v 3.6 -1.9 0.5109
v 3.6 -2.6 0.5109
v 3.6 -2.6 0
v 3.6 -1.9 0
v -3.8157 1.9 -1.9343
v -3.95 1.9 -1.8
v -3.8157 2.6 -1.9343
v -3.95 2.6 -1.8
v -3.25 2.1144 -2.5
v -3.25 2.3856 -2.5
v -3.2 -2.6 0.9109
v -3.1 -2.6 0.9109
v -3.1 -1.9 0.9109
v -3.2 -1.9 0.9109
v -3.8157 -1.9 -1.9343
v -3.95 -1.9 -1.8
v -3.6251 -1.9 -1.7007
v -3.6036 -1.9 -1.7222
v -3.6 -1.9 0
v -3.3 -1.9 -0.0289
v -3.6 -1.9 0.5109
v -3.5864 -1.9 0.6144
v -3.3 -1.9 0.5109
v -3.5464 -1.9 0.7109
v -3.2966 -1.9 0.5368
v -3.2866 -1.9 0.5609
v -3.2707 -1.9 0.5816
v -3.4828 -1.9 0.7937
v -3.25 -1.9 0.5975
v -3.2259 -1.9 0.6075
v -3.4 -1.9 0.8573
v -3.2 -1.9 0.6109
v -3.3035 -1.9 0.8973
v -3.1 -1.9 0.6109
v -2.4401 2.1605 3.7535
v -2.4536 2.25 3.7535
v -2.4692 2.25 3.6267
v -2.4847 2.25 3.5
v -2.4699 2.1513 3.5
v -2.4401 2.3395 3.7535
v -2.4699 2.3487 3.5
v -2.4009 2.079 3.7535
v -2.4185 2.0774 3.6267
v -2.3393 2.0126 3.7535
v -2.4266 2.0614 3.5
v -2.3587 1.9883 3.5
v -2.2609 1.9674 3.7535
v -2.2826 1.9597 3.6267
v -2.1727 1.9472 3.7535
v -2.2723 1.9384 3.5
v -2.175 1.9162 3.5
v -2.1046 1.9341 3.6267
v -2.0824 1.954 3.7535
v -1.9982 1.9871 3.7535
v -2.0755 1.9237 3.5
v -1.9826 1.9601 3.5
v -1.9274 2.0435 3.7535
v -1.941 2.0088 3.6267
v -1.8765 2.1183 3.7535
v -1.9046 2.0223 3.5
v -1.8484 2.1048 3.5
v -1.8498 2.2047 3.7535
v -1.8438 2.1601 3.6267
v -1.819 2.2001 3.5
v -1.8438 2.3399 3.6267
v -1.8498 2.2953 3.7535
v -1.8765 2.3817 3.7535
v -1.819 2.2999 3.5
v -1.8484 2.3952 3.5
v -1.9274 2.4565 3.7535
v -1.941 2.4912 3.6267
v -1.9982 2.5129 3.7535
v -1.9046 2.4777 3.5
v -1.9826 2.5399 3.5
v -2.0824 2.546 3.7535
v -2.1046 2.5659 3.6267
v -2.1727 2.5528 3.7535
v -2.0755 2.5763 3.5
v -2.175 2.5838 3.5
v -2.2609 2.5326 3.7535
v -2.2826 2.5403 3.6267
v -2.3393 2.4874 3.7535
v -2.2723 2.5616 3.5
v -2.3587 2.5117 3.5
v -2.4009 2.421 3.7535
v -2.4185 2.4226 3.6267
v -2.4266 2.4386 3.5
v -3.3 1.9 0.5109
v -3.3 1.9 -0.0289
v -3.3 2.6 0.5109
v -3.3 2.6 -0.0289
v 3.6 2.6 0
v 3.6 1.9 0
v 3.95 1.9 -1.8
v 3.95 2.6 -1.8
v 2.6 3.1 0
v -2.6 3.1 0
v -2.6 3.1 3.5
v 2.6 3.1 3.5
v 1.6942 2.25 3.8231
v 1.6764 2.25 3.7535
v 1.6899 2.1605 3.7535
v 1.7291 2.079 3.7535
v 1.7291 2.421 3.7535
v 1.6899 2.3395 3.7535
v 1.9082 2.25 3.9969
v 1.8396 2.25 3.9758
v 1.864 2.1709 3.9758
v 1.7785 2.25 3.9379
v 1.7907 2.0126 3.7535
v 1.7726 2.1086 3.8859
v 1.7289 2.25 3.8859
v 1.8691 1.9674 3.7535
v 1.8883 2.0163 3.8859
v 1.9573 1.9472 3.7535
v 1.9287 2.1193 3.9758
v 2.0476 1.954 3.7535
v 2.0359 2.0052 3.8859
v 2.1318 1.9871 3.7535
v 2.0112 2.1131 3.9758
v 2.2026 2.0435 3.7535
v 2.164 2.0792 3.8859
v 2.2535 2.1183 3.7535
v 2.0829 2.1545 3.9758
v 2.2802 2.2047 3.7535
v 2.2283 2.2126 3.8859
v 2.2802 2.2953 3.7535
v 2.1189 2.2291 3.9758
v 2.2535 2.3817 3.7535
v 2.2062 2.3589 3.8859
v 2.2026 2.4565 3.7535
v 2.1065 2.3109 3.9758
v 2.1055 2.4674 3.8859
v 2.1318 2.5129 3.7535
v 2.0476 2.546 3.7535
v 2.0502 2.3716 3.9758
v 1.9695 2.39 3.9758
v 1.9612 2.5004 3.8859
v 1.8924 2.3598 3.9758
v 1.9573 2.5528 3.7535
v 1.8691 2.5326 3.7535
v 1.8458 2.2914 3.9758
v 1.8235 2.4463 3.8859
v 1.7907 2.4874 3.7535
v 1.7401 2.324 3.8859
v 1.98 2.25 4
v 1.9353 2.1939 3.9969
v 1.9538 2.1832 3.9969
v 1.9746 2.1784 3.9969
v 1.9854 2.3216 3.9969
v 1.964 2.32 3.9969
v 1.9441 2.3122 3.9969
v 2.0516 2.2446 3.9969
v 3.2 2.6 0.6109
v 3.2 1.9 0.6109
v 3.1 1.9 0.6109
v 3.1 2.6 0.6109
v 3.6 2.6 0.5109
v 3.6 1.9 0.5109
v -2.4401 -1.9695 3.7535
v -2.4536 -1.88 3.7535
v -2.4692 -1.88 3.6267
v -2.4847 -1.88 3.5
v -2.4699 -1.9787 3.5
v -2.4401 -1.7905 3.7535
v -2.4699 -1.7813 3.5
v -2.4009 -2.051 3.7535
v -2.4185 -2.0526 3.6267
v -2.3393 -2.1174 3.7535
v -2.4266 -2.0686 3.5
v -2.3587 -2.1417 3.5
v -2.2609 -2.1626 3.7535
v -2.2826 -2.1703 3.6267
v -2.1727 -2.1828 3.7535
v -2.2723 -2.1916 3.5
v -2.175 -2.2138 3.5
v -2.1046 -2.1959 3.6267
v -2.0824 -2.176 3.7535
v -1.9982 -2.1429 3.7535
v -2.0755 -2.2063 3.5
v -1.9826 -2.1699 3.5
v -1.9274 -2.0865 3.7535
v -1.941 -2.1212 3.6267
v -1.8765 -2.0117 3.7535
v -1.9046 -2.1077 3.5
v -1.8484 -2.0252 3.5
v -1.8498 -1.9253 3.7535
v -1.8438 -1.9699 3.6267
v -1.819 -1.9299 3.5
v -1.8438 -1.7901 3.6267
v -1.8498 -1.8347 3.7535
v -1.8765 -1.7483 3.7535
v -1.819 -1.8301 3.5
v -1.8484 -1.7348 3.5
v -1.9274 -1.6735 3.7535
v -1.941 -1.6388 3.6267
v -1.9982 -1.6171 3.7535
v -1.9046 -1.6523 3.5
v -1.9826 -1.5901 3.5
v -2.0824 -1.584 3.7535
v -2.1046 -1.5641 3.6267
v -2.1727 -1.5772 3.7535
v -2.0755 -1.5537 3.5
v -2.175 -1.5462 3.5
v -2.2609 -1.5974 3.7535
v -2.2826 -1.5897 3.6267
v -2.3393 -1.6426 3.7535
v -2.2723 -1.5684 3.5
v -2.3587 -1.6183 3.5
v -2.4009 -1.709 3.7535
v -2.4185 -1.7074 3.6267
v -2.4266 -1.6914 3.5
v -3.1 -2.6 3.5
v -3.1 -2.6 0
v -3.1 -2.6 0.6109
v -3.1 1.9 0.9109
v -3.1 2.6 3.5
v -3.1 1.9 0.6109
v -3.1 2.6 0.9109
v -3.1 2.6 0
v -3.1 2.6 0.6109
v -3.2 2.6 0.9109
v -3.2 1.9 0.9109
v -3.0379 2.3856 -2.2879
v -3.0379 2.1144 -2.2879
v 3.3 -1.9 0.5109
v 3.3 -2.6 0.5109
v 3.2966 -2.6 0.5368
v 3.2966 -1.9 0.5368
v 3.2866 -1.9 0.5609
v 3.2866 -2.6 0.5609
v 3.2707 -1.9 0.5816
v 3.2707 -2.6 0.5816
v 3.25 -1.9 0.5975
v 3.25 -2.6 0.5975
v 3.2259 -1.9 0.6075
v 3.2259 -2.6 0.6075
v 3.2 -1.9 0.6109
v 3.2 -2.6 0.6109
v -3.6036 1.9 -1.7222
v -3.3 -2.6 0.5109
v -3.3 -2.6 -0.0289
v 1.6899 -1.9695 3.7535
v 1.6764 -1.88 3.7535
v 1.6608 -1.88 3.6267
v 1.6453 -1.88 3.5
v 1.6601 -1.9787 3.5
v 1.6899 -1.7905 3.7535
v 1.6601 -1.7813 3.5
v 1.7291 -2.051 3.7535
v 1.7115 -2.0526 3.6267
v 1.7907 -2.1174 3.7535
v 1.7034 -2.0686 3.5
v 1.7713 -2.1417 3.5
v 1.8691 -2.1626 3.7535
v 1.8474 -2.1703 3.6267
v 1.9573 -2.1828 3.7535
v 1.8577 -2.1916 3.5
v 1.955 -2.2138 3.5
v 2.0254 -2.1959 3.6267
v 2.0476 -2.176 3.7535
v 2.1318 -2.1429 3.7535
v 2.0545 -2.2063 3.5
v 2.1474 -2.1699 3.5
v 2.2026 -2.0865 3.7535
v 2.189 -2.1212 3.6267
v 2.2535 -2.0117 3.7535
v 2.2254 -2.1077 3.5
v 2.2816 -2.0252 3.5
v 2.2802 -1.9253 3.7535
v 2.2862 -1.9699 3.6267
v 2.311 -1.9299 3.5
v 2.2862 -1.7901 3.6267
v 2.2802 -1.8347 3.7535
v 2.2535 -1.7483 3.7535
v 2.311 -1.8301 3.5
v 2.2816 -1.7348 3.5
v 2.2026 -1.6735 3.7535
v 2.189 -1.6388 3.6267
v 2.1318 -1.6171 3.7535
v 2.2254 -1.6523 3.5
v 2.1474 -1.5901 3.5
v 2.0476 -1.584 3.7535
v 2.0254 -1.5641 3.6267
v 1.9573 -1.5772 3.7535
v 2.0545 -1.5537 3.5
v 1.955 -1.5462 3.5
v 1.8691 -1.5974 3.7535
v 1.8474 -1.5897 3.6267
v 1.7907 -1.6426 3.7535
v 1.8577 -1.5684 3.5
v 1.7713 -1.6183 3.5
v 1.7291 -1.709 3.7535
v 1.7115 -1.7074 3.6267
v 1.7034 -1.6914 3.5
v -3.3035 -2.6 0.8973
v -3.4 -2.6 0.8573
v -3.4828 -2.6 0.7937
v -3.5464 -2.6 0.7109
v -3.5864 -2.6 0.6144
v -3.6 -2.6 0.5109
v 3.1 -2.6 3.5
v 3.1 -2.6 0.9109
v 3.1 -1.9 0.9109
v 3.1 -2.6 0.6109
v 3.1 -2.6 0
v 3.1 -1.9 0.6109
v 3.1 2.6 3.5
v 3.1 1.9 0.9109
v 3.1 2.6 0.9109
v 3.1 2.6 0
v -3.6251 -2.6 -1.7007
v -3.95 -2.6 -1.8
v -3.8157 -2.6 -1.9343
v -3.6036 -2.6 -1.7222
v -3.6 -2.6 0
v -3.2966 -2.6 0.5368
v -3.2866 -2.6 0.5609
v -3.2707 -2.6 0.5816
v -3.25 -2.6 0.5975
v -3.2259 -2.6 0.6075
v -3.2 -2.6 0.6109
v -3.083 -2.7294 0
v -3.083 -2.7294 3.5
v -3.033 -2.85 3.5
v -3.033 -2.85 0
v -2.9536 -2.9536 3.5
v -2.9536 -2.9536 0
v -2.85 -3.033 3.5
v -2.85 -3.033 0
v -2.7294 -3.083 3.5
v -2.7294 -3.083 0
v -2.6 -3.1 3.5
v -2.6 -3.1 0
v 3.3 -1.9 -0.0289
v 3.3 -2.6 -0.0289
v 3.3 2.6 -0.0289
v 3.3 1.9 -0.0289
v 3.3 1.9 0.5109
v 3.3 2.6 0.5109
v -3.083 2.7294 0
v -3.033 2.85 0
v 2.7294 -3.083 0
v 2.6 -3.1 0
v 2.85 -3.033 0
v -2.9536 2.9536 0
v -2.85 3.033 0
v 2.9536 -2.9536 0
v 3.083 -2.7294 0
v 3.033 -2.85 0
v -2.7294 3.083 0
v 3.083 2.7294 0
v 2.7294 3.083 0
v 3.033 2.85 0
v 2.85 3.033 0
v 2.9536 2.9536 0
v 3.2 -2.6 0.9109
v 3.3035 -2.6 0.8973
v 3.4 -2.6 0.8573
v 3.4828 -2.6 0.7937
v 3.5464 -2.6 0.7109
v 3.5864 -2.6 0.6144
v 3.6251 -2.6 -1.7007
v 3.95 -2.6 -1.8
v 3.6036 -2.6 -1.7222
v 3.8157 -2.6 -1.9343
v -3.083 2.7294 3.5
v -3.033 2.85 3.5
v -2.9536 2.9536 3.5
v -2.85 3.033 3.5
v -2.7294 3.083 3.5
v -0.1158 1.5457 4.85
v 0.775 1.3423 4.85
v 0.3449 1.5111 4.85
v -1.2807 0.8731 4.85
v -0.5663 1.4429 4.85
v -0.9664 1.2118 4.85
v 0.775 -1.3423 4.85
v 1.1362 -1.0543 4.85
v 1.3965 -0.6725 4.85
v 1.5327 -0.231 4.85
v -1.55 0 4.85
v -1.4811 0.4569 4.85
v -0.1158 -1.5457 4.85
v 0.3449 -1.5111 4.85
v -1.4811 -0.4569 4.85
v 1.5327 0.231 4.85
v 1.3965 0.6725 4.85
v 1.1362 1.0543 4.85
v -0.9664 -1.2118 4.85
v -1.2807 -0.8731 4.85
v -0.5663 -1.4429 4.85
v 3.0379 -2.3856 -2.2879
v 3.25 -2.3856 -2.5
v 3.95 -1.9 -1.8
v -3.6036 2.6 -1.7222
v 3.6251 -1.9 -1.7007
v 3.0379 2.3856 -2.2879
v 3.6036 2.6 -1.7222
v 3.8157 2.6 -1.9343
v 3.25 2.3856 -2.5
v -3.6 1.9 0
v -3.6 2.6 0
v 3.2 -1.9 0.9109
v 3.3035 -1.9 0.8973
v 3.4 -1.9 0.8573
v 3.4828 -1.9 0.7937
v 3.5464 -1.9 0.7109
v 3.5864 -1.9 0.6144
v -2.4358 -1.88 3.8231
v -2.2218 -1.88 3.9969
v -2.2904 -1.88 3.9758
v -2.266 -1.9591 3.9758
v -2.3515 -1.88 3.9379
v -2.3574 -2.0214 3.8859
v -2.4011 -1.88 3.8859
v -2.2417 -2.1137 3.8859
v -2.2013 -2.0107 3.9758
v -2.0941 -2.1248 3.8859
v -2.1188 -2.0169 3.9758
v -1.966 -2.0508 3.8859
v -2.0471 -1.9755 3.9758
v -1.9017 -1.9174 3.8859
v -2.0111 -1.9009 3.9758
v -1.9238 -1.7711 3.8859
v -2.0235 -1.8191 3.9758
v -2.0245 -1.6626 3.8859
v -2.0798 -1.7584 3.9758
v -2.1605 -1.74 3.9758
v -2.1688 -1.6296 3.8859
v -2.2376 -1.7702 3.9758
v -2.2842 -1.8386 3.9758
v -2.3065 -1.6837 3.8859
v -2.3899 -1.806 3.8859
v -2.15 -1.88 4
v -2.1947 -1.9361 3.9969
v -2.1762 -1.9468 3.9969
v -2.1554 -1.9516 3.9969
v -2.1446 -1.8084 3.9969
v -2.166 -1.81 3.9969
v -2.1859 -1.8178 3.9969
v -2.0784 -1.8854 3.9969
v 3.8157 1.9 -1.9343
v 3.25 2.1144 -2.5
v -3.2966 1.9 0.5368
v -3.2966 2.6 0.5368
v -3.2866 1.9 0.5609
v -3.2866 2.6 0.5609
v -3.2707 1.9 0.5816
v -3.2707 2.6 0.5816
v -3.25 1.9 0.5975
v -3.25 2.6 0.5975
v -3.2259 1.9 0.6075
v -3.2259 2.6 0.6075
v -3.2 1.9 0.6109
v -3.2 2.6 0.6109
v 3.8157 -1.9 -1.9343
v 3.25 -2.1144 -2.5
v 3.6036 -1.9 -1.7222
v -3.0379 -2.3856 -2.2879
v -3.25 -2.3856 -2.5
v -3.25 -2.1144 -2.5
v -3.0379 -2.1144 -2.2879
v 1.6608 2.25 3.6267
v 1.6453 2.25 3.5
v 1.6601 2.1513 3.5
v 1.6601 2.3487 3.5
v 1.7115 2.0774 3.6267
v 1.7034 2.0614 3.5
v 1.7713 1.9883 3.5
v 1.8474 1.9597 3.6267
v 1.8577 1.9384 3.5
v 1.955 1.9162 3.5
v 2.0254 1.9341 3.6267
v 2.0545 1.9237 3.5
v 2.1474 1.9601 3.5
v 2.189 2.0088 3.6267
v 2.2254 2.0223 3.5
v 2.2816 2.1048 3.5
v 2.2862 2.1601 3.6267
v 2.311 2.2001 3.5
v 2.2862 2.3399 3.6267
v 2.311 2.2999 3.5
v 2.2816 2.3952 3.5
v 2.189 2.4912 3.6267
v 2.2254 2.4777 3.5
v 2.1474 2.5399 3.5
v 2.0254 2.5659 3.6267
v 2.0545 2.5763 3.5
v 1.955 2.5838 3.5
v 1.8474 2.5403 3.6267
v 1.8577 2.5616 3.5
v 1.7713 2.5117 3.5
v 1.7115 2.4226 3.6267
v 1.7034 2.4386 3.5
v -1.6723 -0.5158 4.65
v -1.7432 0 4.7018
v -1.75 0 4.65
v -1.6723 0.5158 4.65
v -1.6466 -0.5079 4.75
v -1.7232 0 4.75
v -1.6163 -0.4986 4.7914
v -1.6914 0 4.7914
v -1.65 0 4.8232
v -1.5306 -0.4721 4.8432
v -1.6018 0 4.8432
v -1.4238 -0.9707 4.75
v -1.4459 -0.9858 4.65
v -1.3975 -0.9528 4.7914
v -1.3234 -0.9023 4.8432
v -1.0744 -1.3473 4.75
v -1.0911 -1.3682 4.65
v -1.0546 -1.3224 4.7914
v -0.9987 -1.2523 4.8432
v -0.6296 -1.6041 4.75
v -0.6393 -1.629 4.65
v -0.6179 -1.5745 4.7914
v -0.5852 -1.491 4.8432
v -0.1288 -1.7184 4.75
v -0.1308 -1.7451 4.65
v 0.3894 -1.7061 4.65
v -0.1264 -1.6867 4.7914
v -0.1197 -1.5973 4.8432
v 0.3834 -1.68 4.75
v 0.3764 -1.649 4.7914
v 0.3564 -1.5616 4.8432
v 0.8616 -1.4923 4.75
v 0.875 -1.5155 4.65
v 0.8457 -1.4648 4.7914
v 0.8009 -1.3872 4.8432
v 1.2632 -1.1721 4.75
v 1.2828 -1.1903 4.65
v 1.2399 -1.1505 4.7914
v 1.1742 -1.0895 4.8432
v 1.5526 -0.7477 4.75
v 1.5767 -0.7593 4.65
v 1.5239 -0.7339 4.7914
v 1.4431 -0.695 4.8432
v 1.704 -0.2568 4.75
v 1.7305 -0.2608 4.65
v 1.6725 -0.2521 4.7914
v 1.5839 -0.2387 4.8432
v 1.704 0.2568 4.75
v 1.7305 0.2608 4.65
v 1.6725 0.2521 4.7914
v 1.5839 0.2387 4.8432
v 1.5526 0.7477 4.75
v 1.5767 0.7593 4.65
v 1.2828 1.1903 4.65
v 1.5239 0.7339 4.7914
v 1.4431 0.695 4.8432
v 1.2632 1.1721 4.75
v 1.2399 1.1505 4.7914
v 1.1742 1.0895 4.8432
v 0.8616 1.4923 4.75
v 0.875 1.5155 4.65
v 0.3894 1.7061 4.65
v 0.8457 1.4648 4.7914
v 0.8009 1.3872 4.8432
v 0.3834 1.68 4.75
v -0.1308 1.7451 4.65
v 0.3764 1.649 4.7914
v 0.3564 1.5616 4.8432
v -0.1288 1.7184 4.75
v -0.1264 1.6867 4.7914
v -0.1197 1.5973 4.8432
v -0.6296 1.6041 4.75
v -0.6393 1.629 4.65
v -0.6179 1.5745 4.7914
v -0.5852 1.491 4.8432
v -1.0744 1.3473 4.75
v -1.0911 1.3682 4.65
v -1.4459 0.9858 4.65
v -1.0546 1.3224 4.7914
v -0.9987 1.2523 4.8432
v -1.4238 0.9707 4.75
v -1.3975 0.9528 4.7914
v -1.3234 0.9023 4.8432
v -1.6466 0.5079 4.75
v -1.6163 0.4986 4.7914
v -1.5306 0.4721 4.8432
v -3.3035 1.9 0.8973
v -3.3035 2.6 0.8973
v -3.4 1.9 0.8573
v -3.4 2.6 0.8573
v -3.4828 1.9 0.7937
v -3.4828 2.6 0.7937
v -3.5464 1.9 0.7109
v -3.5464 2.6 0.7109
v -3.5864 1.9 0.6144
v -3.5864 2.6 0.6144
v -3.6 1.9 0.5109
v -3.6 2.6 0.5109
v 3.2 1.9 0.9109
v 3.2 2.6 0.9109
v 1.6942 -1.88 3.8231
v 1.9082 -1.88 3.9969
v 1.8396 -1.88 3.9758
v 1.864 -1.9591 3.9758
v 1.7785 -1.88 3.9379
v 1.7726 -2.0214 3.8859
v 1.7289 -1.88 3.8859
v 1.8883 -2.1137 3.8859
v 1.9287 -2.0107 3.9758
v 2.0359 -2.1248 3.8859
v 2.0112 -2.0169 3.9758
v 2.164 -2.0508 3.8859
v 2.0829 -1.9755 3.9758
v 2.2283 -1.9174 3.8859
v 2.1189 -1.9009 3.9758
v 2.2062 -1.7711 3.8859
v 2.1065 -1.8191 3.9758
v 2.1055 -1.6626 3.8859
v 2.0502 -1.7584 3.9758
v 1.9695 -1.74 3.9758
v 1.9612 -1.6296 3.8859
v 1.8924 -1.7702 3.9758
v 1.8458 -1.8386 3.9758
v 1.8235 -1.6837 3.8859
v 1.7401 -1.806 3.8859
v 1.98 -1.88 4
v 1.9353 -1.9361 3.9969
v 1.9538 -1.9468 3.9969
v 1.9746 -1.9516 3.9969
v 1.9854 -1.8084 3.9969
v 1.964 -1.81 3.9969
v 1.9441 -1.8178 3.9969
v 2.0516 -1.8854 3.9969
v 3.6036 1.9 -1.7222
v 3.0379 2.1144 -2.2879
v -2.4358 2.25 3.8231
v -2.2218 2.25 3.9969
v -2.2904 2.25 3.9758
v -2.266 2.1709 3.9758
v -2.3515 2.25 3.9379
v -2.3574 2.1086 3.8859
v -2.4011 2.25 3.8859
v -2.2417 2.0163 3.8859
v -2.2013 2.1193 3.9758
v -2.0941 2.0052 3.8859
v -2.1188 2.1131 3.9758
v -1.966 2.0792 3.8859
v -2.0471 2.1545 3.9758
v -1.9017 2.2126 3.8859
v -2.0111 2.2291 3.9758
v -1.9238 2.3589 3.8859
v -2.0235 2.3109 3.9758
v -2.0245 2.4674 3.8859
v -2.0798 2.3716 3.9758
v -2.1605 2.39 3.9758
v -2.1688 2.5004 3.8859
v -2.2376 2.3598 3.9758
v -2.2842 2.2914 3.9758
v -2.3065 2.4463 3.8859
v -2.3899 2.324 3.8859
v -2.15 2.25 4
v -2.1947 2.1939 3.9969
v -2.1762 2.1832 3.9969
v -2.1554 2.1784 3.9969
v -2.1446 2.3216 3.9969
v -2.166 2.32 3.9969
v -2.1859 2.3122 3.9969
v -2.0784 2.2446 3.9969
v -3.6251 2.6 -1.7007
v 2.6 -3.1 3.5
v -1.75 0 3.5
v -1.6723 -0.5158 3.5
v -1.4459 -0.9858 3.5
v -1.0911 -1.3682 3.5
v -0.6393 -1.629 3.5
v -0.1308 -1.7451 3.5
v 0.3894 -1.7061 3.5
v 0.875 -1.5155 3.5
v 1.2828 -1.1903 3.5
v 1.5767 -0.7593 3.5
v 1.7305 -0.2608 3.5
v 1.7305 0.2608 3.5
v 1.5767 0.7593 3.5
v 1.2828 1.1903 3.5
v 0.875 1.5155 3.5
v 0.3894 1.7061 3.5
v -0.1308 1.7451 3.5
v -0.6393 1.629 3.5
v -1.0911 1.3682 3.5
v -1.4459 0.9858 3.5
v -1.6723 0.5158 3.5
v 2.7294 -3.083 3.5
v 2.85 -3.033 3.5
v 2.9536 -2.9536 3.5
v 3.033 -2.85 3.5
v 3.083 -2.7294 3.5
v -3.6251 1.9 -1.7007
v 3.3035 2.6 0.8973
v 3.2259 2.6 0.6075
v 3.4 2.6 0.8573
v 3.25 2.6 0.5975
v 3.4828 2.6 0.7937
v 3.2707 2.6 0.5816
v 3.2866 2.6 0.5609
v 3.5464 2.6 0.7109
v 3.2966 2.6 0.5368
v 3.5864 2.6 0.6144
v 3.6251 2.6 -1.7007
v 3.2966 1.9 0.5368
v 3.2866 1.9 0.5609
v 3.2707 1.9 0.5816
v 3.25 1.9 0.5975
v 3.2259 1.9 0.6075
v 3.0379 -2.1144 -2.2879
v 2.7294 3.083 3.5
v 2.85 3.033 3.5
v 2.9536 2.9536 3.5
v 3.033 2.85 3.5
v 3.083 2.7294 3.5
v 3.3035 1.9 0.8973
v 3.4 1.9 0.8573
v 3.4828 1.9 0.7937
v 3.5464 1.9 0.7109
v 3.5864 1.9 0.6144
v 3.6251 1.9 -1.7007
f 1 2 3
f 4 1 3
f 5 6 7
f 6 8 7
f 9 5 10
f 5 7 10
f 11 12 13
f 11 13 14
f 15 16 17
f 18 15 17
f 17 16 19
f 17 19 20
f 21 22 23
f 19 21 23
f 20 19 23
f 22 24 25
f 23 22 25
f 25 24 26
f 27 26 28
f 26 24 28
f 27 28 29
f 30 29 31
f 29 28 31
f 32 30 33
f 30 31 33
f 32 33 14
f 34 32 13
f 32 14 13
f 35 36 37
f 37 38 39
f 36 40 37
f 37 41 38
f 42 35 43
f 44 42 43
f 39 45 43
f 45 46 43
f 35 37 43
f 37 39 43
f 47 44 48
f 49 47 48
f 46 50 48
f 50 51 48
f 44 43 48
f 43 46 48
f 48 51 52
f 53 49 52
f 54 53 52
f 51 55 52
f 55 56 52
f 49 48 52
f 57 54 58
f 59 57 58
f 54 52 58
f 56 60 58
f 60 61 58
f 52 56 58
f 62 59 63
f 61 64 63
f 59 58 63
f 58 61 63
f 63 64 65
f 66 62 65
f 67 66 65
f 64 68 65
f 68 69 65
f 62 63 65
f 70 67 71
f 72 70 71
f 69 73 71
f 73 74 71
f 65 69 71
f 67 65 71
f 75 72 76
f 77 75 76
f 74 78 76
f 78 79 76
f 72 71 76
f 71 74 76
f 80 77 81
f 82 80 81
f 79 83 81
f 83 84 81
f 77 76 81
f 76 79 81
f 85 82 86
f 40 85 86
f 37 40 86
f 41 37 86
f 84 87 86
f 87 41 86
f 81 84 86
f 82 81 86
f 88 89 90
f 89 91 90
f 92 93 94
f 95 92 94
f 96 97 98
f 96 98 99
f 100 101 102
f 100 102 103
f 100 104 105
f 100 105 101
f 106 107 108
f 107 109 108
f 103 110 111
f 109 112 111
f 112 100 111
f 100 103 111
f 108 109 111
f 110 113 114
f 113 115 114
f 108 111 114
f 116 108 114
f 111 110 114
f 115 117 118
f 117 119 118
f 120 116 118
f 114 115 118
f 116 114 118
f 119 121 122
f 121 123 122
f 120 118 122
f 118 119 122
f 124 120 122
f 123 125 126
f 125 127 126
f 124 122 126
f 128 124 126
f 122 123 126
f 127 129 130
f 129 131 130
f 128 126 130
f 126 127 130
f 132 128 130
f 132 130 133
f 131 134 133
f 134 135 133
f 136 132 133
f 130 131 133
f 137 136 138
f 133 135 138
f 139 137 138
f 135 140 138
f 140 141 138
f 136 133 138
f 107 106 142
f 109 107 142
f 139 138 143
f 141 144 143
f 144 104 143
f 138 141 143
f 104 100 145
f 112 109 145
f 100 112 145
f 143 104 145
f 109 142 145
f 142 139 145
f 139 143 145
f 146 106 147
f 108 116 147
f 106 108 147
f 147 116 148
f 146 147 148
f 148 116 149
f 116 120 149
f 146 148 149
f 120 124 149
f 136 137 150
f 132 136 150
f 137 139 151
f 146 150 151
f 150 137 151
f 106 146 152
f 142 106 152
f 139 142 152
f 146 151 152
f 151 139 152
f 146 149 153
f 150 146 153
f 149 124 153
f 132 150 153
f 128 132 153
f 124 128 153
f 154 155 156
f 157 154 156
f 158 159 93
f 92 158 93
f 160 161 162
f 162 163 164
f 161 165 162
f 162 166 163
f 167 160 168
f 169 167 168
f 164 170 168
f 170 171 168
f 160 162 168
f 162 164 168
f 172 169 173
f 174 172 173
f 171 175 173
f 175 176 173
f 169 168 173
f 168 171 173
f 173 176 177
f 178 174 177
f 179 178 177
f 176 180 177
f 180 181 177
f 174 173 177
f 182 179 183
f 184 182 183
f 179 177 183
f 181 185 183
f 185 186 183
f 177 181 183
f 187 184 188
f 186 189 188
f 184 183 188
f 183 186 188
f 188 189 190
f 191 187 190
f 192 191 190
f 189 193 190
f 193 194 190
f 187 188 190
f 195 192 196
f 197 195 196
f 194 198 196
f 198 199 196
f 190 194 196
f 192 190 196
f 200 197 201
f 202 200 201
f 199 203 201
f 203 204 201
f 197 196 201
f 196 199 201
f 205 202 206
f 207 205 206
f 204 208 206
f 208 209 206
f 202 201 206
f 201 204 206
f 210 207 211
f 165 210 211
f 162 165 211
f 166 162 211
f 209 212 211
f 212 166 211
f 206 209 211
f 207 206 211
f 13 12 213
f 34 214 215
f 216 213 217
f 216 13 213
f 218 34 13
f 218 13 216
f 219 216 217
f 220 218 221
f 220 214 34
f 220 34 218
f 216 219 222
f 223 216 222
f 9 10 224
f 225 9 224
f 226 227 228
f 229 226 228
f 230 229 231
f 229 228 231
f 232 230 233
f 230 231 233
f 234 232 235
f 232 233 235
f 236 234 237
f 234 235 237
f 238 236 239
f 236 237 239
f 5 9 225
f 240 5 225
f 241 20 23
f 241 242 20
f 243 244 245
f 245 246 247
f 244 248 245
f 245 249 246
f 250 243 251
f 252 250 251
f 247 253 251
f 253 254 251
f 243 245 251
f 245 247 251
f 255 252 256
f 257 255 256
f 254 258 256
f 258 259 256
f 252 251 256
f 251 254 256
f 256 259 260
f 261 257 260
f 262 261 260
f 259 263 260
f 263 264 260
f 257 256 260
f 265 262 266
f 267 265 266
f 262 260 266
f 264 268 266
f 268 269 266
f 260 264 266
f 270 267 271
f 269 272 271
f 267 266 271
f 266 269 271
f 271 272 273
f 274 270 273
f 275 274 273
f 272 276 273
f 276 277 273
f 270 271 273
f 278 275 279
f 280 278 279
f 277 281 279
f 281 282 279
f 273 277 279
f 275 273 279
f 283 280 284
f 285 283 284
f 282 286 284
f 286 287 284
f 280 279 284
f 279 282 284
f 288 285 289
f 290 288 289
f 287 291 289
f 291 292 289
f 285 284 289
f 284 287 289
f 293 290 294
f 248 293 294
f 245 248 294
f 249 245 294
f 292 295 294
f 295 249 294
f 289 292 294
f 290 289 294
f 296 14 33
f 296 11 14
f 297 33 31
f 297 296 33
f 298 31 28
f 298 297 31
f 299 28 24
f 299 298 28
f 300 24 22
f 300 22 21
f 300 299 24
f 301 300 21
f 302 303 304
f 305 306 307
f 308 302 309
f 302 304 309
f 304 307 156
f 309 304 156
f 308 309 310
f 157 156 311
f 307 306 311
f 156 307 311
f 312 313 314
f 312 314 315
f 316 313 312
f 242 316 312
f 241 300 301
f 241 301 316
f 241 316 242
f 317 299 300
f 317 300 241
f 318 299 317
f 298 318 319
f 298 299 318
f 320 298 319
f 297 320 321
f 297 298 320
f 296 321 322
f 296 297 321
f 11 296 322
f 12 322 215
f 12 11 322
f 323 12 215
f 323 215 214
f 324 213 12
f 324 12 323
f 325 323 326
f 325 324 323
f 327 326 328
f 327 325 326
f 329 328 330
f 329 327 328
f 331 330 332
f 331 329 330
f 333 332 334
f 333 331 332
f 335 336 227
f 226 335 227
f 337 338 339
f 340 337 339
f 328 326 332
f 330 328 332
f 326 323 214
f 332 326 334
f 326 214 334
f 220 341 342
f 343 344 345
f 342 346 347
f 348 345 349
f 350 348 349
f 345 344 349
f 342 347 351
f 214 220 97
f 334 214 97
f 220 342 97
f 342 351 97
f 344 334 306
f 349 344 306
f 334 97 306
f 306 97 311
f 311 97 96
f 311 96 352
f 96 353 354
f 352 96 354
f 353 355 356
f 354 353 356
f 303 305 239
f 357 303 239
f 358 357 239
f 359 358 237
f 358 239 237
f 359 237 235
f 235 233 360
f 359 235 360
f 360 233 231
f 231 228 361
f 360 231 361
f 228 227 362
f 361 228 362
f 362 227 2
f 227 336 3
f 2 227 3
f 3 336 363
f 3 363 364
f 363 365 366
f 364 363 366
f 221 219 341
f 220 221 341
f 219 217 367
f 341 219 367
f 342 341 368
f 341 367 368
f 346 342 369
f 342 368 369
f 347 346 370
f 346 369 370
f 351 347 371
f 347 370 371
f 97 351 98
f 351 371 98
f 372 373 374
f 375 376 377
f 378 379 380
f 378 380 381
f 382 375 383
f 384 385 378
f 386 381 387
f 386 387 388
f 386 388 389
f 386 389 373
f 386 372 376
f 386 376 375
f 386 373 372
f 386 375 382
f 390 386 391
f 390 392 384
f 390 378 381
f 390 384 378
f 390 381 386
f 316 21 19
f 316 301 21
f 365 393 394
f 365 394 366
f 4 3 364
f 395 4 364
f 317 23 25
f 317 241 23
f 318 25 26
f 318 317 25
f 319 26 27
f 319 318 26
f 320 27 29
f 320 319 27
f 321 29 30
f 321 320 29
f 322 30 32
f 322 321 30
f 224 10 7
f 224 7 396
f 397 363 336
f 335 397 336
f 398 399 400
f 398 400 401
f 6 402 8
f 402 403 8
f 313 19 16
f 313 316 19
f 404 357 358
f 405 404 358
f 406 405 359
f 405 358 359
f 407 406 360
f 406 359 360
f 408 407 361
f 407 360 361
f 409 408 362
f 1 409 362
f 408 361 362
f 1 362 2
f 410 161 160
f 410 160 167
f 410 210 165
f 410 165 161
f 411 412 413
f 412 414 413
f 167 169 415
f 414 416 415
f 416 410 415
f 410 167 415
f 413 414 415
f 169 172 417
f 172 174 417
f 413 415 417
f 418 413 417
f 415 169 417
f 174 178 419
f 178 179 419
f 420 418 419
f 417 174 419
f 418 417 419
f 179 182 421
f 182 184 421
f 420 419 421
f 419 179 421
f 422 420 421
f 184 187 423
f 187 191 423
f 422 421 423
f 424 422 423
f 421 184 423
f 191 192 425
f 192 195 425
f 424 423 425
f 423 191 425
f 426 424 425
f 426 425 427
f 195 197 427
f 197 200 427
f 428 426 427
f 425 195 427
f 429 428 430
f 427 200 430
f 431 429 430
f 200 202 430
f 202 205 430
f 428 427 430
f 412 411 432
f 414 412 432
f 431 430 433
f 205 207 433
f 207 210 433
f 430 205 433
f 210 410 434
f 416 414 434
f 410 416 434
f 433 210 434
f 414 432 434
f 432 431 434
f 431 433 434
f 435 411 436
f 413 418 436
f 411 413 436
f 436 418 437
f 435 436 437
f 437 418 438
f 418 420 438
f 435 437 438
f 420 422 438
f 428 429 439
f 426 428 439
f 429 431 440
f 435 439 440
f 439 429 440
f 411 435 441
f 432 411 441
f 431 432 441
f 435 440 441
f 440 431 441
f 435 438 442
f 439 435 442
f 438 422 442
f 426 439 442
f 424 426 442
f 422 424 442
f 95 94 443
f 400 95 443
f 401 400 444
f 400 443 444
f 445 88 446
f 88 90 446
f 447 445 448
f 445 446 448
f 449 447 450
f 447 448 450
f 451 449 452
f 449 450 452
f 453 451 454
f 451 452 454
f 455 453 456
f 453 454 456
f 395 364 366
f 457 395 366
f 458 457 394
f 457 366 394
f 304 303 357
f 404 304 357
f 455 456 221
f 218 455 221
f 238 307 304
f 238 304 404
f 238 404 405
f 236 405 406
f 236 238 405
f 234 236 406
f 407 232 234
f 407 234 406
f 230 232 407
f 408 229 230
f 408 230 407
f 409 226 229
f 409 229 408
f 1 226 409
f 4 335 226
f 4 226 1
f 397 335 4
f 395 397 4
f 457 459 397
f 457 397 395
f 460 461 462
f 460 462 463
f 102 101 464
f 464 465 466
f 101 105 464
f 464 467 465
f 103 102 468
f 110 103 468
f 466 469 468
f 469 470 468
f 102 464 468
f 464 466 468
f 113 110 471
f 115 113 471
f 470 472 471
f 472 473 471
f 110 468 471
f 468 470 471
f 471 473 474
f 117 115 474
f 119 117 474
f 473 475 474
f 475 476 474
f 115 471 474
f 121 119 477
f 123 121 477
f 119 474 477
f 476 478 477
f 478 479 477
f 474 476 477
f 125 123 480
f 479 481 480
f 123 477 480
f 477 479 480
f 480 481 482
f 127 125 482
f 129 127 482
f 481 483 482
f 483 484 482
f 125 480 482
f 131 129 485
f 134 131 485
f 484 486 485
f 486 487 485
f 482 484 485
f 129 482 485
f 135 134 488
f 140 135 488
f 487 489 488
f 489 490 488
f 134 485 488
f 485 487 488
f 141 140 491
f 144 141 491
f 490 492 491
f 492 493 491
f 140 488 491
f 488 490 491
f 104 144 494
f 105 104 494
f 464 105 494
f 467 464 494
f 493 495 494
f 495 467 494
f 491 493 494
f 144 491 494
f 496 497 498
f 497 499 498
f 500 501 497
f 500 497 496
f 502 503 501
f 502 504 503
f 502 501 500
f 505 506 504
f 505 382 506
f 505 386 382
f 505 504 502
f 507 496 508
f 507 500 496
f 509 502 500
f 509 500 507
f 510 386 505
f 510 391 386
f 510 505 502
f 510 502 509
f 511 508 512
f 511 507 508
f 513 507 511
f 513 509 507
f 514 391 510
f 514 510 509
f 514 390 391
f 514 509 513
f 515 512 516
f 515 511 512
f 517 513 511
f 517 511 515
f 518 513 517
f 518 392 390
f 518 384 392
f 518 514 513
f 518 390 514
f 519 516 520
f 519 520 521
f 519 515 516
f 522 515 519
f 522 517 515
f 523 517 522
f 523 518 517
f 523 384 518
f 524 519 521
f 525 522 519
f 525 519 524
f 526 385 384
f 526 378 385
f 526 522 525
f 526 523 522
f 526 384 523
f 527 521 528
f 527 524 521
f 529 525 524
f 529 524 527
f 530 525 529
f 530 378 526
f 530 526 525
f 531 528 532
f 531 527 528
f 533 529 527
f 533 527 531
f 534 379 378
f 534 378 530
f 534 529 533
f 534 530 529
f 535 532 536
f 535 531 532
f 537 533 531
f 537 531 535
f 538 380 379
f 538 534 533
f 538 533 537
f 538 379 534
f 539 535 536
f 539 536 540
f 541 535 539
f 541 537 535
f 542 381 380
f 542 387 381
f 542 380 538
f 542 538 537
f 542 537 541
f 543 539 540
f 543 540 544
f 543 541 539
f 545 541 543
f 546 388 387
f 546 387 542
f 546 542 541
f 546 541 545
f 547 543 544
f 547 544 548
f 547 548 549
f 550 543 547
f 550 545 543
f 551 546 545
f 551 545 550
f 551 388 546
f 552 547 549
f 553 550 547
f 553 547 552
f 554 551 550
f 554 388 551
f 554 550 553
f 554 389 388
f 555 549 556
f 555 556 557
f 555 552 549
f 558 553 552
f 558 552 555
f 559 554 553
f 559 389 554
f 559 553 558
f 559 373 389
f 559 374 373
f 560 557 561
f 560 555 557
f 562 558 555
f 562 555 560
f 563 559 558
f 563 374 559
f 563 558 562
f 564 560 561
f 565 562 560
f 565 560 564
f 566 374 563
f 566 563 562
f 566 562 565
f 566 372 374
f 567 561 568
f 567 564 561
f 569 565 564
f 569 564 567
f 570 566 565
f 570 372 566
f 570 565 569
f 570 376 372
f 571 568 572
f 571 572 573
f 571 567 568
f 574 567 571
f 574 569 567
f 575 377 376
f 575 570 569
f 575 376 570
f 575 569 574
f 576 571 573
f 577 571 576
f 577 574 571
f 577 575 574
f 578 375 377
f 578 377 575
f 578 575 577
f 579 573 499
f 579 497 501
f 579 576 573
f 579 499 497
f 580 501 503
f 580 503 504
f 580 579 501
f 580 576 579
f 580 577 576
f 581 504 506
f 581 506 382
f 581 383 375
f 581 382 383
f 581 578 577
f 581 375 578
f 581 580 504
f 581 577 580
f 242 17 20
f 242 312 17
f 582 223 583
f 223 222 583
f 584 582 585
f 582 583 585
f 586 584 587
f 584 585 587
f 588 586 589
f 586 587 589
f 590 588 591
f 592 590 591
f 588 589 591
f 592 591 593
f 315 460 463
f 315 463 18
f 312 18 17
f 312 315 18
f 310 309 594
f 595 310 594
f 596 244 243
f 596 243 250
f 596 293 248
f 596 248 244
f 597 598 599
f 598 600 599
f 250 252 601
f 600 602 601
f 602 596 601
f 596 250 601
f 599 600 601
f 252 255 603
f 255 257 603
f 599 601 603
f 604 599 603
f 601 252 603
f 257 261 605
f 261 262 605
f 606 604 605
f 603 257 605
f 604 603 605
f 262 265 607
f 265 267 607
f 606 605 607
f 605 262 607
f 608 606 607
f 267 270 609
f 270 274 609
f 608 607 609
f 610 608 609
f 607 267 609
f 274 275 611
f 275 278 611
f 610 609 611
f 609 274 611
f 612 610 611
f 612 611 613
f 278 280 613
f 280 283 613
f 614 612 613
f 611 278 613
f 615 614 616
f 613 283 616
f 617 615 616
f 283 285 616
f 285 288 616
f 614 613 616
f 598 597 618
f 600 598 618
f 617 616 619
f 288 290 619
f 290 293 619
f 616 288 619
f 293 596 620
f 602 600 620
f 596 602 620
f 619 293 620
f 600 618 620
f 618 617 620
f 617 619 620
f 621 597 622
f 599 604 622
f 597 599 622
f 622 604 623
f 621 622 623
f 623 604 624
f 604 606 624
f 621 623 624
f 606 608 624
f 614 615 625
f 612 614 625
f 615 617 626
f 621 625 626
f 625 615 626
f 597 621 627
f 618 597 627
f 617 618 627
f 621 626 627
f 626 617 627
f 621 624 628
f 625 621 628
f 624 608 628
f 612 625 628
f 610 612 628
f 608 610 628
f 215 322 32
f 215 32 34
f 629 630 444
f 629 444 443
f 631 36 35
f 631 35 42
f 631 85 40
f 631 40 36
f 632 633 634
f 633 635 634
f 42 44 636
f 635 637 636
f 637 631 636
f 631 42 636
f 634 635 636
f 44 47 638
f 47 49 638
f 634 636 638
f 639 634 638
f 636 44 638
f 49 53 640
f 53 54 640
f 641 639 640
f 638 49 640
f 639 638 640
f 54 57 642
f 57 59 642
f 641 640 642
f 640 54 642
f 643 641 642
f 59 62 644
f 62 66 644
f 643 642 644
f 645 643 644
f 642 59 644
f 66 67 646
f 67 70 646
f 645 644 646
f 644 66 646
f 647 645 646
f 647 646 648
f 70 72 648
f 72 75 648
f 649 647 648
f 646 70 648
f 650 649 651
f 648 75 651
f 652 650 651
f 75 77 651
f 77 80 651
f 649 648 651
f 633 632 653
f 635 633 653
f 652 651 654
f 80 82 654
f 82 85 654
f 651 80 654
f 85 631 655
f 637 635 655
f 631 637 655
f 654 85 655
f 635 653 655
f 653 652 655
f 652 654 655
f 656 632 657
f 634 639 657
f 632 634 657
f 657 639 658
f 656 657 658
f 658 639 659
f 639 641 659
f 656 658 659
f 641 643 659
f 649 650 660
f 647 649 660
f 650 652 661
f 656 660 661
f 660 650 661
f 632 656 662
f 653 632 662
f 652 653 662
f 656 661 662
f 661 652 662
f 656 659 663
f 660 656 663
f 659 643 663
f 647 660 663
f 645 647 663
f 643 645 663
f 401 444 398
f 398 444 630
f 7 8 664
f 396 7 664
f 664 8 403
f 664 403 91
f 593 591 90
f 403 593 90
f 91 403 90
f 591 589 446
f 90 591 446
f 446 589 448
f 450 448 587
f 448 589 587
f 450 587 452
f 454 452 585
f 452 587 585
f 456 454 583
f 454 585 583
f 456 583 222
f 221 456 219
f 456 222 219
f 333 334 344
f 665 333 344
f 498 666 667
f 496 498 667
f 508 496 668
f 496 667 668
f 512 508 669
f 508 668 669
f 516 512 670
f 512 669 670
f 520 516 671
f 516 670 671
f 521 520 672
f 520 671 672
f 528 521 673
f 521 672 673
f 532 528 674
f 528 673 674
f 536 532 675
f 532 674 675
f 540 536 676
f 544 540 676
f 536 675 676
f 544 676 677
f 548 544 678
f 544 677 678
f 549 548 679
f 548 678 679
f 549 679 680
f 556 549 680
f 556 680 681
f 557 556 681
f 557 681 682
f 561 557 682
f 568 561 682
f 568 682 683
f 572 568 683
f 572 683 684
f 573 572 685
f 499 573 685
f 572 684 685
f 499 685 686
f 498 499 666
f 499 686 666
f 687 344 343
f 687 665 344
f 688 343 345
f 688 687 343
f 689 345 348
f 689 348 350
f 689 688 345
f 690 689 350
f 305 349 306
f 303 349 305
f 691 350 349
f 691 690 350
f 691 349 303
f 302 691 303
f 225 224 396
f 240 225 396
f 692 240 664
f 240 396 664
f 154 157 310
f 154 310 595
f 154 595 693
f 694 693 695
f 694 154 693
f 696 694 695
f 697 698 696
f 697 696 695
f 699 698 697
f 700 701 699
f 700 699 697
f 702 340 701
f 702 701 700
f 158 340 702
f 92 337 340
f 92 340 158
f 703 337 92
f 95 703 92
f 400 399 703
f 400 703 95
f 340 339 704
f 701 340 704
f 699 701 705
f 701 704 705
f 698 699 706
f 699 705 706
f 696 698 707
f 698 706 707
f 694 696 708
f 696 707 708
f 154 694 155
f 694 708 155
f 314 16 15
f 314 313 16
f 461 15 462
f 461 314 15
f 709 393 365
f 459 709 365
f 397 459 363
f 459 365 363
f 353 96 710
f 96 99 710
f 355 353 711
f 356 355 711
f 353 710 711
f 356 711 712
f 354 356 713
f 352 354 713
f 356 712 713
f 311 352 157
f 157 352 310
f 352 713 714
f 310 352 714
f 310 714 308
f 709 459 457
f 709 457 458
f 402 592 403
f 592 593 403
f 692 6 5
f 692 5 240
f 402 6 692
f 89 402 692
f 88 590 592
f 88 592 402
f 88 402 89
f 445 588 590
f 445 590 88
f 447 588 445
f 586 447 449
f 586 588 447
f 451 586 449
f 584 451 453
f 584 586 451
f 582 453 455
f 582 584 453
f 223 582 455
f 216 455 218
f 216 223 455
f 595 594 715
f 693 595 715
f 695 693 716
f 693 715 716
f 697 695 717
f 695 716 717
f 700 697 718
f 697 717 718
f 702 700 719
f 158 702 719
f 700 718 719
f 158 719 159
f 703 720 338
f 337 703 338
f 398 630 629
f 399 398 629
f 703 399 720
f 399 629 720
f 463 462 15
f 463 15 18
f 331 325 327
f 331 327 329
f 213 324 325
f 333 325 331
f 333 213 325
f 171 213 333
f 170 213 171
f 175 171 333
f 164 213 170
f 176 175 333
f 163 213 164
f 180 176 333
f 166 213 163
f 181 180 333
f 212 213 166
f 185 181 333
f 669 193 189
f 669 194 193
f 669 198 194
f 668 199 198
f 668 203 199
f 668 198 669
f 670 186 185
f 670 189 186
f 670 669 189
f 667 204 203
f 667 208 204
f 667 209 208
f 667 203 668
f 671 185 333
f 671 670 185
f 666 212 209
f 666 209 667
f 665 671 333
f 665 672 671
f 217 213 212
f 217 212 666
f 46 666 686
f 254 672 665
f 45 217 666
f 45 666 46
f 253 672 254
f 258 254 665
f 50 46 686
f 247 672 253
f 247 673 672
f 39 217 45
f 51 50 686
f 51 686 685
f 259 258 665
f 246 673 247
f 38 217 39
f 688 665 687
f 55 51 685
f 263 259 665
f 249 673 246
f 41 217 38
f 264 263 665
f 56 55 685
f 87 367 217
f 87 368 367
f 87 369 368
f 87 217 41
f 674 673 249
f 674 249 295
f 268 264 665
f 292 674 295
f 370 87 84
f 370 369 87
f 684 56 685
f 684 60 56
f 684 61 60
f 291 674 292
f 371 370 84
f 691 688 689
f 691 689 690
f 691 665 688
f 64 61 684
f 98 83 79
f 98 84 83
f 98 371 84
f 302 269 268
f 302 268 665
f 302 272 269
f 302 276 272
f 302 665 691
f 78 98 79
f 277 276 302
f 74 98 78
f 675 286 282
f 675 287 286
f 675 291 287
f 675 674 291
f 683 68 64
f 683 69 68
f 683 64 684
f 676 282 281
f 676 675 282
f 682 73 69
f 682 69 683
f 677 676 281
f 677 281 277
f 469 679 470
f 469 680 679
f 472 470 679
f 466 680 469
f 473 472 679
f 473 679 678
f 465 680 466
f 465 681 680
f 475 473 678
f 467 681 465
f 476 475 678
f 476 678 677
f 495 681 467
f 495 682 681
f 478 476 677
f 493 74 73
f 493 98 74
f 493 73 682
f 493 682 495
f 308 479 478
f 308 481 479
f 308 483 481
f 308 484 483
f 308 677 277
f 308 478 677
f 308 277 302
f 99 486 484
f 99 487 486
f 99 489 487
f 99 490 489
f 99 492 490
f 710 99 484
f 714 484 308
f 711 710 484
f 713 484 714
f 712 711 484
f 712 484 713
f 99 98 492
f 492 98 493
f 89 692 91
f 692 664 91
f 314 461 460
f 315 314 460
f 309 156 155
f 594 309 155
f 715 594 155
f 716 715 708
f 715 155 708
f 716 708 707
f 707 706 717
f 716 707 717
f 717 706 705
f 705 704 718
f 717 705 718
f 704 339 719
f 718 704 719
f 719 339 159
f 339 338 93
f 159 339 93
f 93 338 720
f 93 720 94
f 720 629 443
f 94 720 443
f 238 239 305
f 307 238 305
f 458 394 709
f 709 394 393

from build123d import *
from OCP.BRepFilletAPI import BRepFilletAPI_MakeChamfer

# Parameters (mm, degrees)
SKETCH1_W                 = 6.2
SKETCH1_H                 = 6.2
EXTRUDE1_DEPTH            = 3.5
SKETCH2_R                 = 1.75
EXTRUDE2_DEPTH            = 1.35
LPATTERN1_COUNT           = 2
LPATTERN1_PITCH           = 4.13
LPATTERN1_COUNT_DIR2      = 2
LPATTERN1_PITCH_DIR2      = 4.13
FILLET1_R                 = 0.5
FILLET2_R                 = 0.2
EXTRUDE3_DEPTH            = 0.35
CHAMFER1_SIZE             = 0.8
CHAMFER1_SIZE2            = 0.214359354
CHAMFER1_OF_MIRROR1_SIZE  = 0.8
CHAMFER1_OF_MIRROR1_SIZE2 = 0.214359354
MIRROR2_START             = -2.6
MIRROR2_DEPTH             = 0.7
MIRROR2_START_2           = 1.9
MIRROR2_2_DEPTH           = 0.7
MIRROR2_START_3           = 3.765863992
MIRROR2_3_DEPTH           = 0.3


with BuildPart() as part:
    # Sketch1 → Extrude1 (new body)
    with BuildSketch(Plane.XY):
        Rectangle(SKETCH1_W, SKETCH1_H)
    extrude(amount=EXTRUDE1_DEPTH)

    # Sketch2 → Extrude2 (add)
    with BuildSketch(Plane.XY.offset(3.5)):
        with Locations(Location((0, 0, 0), (0, 0, 180))):
            Circle(SKETCH2_R)
    extrude(amount=EXTRUDE2_DEPTH)

    # Sketch4 → Revolve1 (revolve)
    with BuildSketch(Plane(origin=(0, 2.25, 0), x_dir=(-1, 0, 0), z_dir=(0, 1, 0)), mode=Mode.PRIVATE) as revolve1_sk:
        with BuildLine():
            Line((1.815270458, 3.5), (2.15, 3.5))
            Line((2.15, 3.5), (2.15, 4))
            ThreePointArc((2.15, 4), (1.948488877, 3.937944347), (1.846391659, 3.753461841))
            Line((1.846391659, 3.753461841), (1.815270458, 3.5))
        make_face()
    revolve1 = revolve(revolve1_sk.sketch.rotate(Axis((-2.15, 2.25, 2.844368125), (0, 0, 1)), 180), axis=Axis((-2.15, 2.25, 2.844368125), (0, 0, 1)))

    # LPattern1: Revolve1 2 × 2
    with Locations(*[(i * LPATTERN1_PITCH, -j * LPATTERN1_PITCH_DIR2, 0) for i in range(LPATTERN1_COUNT) for j in range(LPATTERN1_COUNT_DIR2) if (i, j) != (0, 0)]):
        add(revolve1)

    # Fillet1
    fillet1_edges = [part.edges().sort_by_distance(p)[0] for p in [
        (-3.1, 3.1, 1.75),
        (3.1, 3.1, 1.75),
        (3.1, -3.1, 1.75),
        (-3.1, -3.1, 1.75),
    ]]
    fillet(fillet1_edges, radius=FILLET1_R)

    # Fillet2
    fillet2_edges = [part.edges().sort_by_distance(p)[0] for p in [
        (1.75, 0, 4.85),
    ]]
    fillet(fillet2_edges, radius=FILLET2_R)

    # Sketch5 → Extrude3 (add, symmetric)
    with BuildSketch(Plane(origin=(0, 2.25, 0), x_dir=(-1, 0, 0), z_dir=(0, 1, 0))):
        with BuildLine():
            Line((3.1, 0.91088803), (3.2, 0.91088803))
            ThreePointArc((3.2, 0.91088803), (3.482842712, 0.793730742), (3.6, 0.51088803))
            Line((3.6, 0.51088803), (3.6, 0))
            Line((3.6, 0), (3.95, -1.8))
            Line((3.95, -1.8), (3.25, -2.5))
            Line((3.25, -2.5), (3.037867966, -2.287867966))
            Line((3.037867966, -2.287867966), (3.625066954, -1.700668977))
            Line((3.625066954, -1.700668977), (3.3, -0.02889607))
            Line((3.3, -0.02889607), (3.3, 0.51088803))
            ThreePointArc((3.3, 0.51088803), (3.270710678, 0.581598708), (3.2, 0.61088803))
            Line((3.2, 0.61088803), (3.1, 0.61088803))
            Line((3.1, 0.61088803), (3.1, 0.91088803))
        make_face()
    extrude3 = extrude(amount=EXTRUDE3_DEPTH, both=True)

    # Chamfer1: one chamfer whose edges measure the first distance from different faces: ONE call of the kernel's chamfer builder (chamfer() names one face for all edges)
    chamfer1_edges_1 = [part.edges().sort_by_distance(p)[0] for p in [
        (-3.143933983, 1.9, -2.393933983),
    ]]
    chamfer1_side_1 = [part.faces().sort_by_distance(p)[0] for p in [
        (-3.520562137, 1.9, -0.80393009),
    ]]
    chamfer1_edges_2 = [part.edges().sort_by_distance(p)[0] for p in [
        (-3.143933983, 2.6, -2.393933983),
    ]]
    chamfer1_side_2 = [part.faces().sort_by_distance(p)[0] for p in [
        (-3.520562137, 2.6, -0.80393009),
    ]]
    chamfer1 = BRepFilletAPI_MakeChamfer(part.part.solid().wrapped)
    for e in chamfer1_edges_1:
        chamfer1.Add(CHAMFER1_SIZE, CHAMFER1_SIZE2, e.wrapped, chamfer1_side_1[0].wrapped)  # the first distance lies on this face
    for e in chamfer1_edges_2:
        chamfer1.Add(CHAMFER1_SIZE, CHAMFER1_SIZE2, e.wrapped, chamfer1_side_2[0].wrapped)  # the first distance lies on this face
    add(Compound.cast(chamfer1.Shape()), mode=Mode.REPLACE)

    # Mirror1: Extrude3 across plane
    add(extrude3.mirror(Plane.ZX))

    # Chamfer1 of Mirror1: one chamfer whose edges measure the first distance from different faces: ONE call of the kernel's chamfer builder (chamfer() names one face for all edges)
    chamfer1_of_mirror1_edges_1 = [part.edges().sort_by_distance(p)[0] for p in [
        (-3.143933983, -1.9, -2.393933983),
    ]]
    chamfer1_of_mirror1_side_1 = [part.faces().sort_by_distance(p)[0] for p in [
        (-3.520562137, -1.9, -0.80393009),
    ]]
    chamfer1_of_mirror1_edges_2 = [part.edges().sort_by_distance(p)[0] for p in [
        (-3.143933983, -2.6, -2.393933983),
    ]]
    chamfer1_of_mirror1_side_2 = [part.faces().sort_by_distance(p)[0] for p in [
        (-3.520562137, -2.6, -0.80393009),
    ]]
    chamfer1_of_mirror1 = BRepFilletAPI_MakeChamfer(part.part.solid().wrapped)
    for e in chamfer1_of_mirror1_edges_1:
        chamfer1_of_mirror1.Add(CHAMFER1_OF_MIRROR1_SIZE, CHAMFER1_OF_MIRROR1_SIZE2, e.wrapped, chamfer1_of_mirror1_side_1[0].wrapped)  # the first distance lies on this face
    for e in chamfer1_of_mirror1_edges_2:
        chamfer1_of_mirror1.Add(CHAMFER1_OF_MIRROR1_SIZE, CHAMFER1_OF_MIRROR1_SIZE2, e.wrapped, chamfer1_of_mirror1_side_2[0].wrapped)  # the first distance lies on this face
    add(Compound.cast(chamfer1_of_mirror1.Shape()), mode=Mode.REPLACE)

    # Mirror2: read off the stored shape, not the designer's step
    # Mirror2 outline → Mirror2 (add)
    with BuildSketch(Plane(origin=(0, 0, 0), x_dir=(1, 0, 0), z_dir=(0, 1, 0)).offset(MIRROR2_START)):
        with BuildLine():
            ThreePointArc((3.3, -0.51088803), (3.270710678, -0.581598708), (3.2, -0.61088803))
            Line((3.2, -0.61088803), (3.1, -0.61088803))
            Line((3.1, -0.61088803), (3.1, -0.91088803))
            Line((3.1, -0.91088803), (3.2, -0.91088803))
            ThreePointArc((3.2, -0.91088803), (3.482842712, -0.793730742), (3.6, -0.51088803))
            Line((3.6, -0.51088803), (3.6, 0))
            Line((3.6, 0), (3.95, 1.8))
            Line((3.95, 1.8), (3.25, 2.5))
            Line((3.25, 2.5), (3.037867966, 2.287867966))
            Line((3.037867966, 2.287867966), (3.625066954, 1.700668977))
            Line((3.625066954, 1.700668977), (3.3, 0.02889607))
            Line((3.3, 0.02889607), (3.3, -0.51088803))
        make_face()
    extrude(amount=MIRROR2_DEPTH)

    # Mirror2 2 outline → Mirror2 2 (add)
    with BuildSketch(Plane(origin=(0, 0, 0), x_dir=(1, 0, 0), z_dir=(0, 1, 0)).offset(MIRROR2_START_2)):
        with BuildLine():
            ThreePointArc((3.3, -0.51088803), (3.270710678, -0.581598708), (3.2, -0.61088803))
            Line((3.2, -0.61088803), (3.1, -0.61088803))
            Line((3.1, -0.61088803), (3.1, -0.91088803))
            Line((3.1, -0.91088803), (3.2, -0.91088803))
            ThreePointArc((3.2, -0.91088803), (3.482842712, -0.793730742), (3.6, -0.51088803))
            Line((3.6, -0.51088803), (3.6, 0))
            Line((3.6, 0), (3.95, 1.8))
            Line((3.95, 1.8), (3.25, 2.5))
            Line((3.25, 2.5), (3.037867966, 2.287867966))
            Line((3.037867966, 2.287867966), (3.625066954, 1.700668977))
            Line((3.625066954, 1.700668977), (3.3, 0.02889607))
            Line((3.3, 0.02889607), (3.3, -0.51088803))
        make_face()
    extrude(amount=MIRROR2_2_DEPTH)

    # Mirror2 3 outline → Mirror2 3 (cut)
    with BuildSketch(Plane(origin=(0, 0, 0), x_dir=(0.7071067811865487, 0, 0.7071067811865464), z_dir=(0.7071067811865465, 0, -0.7071067811865485)).offset(MIRROR2_START_3)):
        Polygon((0.530330086, -2.6), (1.330330086, -2.6), (0.530330086, -2.385640646), align=None)
        Polygon((0.530330086, -1.9), (0.530330086, -2.114359354), (1.330330086, -1.9), align=None)
        Polygon((1.330330086, 1.9), (0.530330086, 2.114359354), (0.530330086, 1.9), align=None)
        Polygon((0.530330086, 2.385640646), (1.330330086, 2.6), (0.530330086, 2.6), align=None)
    extrude(amount=MIRROR2_3_DEPTH, mode=Mode.SUBTRACT)


solid = part.part
